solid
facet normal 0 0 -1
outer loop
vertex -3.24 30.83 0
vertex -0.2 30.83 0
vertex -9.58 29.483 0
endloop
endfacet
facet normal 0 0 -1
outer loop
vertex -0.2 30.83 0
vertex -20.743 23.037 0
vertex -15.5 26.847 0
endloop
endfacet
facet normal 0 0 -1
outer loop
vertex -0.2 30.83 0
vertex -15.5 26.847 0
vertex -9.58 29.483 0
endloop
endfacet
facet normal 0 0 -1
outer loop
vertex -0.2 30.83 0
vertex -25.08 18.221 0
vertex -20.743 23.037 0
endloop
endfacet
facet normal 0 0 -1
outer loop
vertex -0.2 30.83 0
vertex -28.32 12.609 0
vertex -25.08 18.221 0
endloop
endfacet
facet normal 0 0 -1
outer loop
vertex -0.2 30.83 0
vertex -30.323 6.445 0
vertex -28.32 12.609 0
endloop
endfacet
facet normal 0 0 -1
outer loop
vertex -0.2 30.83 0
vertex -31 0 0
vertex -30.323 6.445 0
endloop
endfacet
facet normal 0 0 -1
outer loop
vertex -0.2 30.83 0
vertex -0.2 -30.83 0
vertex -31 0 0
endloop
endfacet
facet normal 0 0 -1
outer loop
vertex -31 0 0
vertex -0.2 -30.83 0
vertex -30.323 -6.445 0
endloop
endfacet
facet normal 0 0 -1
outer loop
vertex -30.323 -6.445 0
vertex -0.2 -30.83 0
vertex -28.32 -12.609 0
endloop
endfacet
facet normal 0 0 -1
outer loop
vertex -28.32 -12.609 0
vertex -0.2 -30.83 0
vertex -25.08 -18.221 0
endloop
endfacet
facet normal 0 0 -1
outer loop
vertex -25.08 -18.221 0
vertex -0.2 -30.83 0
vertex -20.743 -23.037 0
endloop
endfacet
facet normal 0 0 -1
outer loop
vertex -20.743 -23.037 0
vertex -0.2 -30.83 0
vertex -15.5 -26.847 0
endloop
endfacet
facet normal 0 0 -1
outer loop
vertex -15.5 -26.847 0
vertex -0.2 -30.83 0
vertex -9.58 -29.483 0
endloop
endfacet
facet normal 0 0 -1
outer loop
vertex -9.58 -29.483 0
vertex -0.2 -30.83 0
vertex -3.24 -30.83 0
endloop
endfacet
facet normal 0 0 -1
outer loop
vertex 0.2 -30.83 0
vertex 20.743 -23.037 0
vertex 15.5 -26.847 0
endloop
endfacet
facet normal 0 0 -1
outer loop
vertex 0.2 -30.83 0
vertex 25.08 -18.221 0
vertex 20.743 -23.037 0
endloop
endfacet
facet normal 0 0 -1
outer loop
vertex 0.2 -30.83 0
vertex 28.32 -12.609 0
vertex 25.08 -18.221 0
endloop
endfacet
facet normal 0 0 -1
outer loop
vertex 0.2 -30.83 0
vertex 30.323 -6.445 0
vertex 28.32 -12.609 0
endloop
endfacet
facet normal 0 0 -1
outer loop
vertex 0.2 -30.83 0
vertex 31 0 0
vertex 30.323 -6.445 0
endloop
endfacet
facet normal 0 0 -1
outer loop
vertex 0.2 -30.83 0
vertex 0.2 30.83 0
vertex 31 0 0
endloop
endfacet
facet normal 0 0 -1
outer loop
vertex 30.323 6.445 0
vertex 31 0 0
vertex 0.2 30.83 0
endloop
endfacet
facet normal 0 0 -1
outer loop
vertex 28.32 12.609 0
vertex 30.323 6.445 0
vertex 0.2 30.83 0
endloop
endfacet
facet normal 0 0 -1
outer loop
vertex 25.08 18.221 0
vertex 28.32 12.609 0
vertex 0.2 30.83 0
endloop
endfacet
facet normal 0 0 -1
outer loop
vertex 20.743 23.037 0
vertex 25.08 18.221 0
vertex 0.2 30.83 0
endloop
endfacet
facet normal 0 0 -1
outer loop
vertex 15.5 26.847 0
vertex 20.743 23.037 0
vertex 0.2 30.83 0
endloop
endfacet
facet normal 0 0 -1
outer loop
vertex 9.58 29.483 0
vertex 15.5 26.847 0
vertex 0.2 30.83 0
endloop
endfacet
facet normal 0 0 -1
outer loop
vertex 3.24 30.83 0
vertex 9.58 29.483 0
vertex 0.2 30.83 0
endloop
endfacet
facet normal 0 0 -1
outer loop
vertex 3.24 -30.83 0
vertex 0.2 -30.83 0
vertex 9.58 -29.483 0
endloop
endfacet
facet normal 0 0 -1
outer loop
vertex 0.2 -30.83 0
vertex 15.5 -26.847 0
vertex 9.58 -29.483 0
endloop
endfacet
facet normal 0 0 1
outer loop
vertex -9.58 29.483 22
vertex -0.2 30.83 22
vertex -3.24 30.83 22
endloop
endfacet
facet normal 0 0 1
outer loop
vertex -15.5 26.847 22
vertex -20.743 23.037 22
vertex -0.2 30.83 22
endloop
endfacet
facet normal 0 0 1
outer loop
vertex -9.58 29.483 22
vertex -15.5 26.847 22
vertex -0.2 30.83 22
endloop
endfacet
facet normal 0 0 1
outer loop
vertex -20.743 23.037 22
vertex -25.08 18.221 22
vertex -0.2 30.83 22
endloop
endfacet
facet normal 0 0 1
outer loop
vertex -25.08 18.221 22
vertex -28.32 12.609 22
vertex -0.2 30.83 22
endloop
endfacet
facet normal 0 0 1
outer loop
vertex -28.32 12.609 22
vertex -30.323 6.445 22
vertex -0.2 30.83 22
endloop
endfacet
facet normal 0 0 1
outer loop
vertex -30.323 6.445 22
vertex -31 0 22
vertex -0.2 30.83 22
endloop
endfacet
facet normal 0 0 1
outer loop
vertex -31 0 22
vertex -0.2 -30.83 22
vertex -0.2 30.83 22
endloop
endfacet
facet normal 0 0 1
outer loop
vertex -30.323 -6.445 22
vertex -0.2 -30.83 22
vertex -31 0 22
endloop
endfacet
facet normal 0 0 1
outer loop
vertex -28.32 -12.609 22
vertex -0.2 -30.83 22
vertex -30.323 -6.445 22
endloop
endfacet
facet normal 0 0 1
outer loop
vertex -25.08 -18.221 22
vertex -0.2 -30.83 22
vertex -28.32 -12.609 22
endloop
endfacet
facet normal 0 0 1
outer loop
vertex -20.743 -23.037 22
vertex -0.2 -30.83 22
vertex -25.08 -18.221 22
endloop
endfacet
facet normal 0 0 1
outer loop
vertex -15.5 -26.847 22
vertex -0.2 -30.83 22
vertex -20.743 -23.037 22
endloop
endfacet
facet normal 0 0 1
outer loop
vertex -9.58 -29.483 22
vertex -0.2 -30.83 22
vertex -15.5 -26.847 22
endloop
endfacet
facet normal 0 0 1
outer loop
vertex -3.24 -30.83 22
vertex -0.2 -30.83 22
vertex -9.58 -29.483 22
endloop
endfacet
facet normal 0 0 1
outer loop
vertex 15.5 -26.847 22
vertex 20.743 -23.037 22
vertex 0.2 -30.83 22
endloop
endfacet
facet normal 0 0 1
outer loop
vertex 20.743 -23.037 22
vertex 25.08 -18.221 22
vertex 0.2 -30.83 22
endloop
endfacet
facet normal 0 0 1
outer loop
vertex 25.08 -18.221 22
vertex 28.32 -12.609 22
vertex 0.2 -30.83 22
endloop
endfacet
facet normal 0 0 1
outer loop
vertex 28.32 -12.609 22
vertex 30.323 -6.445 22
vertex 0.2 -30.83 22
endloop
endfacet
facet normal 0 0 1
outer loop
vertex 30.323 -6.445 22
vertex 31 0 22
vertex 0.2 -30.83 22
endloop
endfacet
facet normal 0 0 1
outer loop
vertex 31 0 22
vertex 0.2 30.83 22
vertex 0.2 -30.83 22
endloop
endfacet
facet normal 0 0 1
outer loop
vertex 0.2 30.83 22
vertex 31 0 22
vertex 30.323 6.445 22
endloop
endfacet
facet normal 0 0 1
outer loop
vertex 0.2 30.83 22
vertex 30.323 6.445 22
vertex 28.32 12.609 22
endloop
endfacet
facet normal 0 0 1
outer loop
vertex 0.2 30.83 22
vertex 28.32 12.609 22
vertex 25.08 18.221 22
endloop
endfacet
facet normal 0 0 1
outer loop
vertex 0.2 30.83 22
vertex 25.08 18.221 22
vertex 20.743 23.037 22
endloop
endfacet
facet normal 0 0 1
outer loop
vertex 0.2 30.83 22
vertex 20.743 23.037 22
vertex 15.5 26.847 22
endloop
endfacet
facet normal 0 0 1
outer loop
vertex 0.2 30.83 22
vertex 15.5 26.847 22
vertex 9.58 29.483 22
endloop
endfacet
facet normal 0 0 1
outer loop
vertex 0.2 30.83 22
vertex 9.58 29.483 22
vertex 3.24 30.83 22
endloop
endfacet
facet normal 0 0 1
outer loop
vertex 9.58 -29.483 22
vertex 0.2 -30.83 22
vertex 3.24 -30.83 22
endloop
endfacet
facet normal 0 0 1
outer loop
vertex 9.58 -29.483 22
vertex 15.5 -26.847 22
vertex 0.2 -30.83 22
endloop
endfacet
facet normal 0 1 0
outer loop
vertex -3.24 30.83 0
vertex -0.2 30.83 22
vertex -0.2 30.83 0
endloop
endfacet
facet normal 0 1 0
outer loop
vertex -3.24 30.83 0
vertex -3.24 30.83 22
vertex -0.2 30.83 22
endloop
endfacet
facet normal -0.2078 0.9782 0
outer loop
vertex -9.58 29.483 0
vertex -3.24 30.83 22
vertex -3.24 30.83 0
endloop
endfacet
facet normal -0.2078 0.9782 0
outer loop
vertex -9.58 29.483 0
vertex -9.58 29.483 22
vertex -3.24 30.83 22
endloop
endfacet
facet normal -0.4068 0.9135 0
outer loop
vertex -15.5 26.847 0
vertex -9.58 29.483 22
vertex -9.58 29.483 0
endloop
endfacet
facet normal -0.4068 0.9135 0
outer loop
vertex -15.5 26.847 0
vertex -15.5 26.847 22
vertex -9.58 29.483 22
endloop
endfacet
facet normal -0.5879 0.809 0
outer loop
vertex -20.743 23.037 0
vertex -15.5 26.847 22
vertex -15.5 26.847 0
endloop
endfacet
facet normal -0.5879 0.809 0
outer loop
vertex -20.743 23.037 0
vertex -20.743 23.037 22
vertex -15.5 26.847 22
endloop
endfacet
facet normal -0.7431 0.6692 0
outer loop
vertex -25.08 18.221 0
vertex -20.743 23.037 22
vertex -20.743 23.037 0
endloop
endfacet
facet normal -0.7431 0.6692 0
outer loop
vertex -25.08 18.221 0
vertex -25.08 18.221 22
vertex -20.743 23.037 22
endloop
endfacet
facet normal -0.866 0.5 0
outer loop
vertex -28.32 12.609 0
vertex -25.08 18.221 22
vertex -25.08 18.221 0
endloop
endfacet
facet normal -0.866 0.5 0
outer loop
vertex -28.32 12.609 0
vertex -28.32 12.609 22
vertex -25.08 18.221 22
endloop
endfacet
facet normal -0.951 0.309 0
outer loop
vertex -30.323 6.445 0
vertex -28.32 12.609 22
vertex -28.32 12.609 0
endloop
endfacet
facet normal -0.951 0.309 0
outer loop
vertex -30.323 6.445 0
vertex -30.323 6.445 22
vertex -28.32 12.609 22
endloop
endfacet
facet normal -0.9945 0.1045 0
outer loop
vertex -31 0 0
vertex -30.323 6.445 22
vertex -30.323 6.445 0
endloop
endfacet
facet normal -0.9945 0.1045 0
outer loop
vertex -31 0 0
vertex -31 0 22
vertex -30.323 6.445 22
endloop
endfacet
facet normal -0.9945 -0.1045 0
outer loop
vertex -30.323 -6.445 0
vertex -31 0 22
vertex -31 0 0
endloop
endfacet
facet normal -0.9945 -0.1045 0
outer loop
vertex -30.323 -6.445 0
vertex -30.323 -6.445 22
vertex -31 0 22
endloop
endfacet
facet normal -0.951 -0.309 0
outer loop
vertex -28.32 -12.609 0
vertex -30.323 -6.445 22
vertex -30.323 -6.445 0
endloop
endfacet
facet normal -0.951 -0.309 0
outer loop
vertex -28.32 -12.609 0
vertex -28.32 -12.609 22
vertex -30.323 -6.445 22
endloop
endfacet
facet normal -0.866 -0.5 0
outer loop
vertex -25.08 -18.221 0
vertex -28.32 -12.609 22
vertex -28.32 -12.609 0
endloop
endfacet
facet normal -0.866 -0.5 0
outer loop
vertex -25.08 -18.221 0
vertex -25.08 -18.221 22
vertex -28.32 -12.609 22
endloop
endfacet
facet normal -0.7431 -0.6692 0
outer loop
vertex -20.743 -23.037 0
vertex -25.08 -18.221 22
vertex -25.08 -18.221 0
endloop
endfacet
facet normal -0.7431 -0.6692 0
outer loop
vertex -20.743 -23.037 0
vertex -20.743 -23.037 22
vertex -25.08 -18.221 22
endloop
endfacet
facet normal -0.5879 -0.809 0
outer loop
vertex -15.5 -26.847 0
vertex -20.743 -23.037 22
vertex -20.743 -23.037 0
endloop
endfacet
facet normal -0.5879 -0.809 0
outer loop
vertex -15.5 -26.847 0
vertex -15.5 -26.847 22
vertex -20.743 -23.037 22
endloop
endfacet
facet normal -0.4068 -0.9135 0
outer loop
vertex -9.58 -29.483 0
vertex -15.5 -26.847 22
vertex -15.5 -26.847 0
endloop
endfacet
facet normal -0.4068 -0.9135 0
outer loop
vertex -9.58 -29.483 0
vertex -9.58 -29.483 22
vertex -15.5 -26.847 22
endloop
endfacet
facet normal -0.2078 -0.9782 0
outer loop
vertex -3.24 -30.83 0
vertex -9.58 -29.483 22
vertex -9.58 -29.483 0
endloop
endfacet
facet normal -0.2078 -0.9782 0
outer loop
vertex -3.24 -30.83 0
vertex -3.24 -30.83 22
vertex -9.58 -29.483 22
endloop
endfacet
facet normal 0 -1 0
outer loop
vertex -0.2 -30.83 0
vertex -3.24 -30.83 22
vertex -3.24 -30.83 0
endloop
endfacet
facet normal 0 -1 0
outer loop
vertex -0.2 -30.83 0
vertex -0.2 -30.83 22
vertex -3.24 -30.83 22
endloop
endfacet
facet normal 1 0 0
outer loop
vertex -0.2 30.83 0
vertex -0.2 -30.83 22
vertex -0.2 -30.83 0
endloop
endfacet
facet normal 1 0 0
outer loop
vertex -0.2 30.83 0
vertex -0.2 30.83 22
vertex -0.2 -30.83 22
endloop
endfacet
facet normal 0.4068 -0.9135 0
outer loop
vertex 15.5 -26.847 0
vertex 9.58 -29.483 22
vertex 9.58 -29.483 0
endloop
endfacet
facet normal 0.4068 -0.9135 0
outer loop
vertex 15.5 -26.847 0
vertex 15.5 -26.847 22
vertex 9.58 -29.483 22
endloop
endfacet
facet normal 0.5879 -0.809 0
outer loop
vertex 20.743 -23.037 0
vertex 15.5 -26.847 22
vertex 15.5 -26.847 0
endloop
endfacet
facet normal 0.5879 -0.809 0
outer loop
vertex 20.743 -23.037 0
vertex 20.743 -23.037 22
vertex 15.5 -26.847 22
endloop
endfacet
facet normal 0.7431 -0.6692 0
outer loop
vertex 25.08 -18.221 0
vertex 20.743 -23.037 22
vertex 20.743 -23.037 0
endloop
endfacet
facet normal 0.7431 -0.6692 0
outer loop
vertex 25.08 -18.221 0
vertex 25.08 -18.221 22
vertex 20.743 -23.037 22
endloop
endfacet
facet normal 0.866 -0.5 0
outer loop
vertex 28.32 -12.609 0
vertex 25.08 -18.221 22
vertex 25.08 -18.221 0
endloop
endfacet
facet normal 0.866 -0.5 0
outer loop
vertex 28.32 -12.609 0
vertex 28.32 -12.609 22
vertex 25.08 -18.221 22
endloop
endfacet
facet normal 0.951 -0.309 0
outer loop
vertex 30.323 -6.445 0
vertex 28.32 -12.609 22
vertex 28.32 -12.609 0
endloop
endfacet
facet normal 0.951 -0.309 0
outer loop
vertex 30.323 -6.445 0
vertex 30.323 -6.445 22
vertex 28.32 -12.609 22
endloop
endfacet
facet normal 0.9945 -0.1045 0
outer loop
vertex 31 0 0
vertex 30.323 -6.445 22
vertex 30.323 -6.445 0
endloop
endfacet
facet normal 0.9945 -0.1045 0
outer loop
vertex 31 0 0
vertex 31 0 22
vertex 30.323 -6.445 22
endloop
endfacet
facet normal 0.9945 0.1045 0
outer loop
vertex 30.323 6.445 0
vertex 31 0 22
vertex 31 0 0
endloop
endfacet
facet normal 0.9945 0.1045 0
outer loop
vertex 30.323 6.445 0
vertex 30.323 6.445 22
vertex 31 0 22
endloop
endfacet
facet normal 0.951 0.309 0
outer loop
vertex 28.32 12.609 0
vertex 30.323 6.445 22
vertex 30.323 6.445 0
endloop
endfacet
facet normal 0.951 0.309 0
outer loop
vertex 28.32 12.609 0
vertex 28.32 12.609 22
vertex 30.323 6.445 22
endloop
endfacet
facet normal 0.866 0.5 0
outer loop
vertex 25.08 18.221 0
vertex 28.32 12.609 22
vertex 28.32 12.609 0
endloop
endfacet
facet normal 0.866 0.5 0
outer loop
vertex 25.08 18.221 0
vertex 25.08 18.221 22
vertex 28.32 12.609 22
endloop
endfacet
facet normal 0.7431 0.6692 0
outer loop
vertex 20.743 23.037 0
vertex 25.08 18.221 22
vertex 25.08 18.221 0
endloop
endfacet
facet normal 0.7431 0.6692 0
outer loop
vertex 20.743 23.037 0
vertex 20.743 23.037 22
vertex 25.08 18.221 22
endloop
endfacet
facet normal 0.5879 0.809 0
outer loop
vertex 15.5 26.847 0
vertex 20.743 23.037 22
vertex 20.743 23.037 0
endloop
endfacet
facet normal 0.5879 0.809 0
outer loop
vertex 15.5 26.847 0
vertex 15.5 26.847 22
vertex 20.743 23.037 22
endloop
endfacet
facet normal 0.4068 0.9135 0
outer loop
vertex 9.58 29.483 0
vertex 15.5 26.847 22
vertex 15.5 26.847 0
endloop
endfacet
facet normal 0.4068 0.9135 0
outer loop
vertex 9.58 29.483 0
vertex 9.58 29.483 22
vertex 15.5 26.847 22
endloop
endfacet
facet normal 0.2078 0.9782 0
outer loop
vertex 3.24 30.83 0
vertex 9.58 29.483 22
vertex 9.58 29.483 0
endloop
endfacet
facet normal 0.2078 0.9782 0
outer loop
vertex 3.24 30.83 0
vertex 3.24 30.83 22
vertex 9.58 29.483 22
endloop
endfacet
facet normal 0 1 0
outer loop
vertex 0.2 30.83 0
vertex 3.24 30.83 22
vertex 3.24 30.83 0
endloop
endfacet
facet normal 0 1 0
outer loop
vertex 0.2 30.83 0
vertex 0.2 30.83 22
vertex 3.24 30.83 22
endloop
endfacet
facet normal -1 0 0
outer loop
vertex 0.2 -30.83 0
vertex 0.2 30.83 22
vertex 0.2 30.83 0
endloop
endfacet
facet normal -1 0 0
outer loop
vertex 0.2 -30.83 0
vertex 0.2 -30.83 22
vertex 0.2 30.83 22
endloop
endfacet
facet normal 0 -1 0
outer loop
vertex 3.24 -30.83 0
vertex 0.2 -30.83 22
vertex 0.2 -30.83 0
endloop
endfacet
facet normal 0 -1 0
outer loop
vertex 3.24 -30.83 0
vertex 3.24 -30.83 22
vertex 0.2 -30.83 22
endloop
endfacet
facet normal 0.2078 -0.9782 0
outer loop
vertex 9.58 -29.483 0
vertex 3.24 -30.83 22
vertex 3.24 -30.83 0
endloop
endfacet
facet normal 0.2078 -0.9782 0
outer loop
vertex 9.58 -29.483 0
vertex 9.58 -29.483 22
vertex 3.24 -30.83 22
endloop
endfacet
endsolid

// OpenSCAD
//Konfiguration
//Radius
    r = 31;
//Höhe des Kuchens
    h = 22;
//Anzahl der Stücke (gerade Zahl)
    n = 2;
    
module Schnitt (b = 0.4, l = 2*r+2)
    translate([0, 0, 0])
    for (i = [0:n-1]) {
        rotate(i*360/n)
        square([b, l], true);
    }

module Kuchen ()
    linear_extrude(height = h)
    difference(){
        circle(r, true);
        Schnitt();   
}

Kuchen ();
